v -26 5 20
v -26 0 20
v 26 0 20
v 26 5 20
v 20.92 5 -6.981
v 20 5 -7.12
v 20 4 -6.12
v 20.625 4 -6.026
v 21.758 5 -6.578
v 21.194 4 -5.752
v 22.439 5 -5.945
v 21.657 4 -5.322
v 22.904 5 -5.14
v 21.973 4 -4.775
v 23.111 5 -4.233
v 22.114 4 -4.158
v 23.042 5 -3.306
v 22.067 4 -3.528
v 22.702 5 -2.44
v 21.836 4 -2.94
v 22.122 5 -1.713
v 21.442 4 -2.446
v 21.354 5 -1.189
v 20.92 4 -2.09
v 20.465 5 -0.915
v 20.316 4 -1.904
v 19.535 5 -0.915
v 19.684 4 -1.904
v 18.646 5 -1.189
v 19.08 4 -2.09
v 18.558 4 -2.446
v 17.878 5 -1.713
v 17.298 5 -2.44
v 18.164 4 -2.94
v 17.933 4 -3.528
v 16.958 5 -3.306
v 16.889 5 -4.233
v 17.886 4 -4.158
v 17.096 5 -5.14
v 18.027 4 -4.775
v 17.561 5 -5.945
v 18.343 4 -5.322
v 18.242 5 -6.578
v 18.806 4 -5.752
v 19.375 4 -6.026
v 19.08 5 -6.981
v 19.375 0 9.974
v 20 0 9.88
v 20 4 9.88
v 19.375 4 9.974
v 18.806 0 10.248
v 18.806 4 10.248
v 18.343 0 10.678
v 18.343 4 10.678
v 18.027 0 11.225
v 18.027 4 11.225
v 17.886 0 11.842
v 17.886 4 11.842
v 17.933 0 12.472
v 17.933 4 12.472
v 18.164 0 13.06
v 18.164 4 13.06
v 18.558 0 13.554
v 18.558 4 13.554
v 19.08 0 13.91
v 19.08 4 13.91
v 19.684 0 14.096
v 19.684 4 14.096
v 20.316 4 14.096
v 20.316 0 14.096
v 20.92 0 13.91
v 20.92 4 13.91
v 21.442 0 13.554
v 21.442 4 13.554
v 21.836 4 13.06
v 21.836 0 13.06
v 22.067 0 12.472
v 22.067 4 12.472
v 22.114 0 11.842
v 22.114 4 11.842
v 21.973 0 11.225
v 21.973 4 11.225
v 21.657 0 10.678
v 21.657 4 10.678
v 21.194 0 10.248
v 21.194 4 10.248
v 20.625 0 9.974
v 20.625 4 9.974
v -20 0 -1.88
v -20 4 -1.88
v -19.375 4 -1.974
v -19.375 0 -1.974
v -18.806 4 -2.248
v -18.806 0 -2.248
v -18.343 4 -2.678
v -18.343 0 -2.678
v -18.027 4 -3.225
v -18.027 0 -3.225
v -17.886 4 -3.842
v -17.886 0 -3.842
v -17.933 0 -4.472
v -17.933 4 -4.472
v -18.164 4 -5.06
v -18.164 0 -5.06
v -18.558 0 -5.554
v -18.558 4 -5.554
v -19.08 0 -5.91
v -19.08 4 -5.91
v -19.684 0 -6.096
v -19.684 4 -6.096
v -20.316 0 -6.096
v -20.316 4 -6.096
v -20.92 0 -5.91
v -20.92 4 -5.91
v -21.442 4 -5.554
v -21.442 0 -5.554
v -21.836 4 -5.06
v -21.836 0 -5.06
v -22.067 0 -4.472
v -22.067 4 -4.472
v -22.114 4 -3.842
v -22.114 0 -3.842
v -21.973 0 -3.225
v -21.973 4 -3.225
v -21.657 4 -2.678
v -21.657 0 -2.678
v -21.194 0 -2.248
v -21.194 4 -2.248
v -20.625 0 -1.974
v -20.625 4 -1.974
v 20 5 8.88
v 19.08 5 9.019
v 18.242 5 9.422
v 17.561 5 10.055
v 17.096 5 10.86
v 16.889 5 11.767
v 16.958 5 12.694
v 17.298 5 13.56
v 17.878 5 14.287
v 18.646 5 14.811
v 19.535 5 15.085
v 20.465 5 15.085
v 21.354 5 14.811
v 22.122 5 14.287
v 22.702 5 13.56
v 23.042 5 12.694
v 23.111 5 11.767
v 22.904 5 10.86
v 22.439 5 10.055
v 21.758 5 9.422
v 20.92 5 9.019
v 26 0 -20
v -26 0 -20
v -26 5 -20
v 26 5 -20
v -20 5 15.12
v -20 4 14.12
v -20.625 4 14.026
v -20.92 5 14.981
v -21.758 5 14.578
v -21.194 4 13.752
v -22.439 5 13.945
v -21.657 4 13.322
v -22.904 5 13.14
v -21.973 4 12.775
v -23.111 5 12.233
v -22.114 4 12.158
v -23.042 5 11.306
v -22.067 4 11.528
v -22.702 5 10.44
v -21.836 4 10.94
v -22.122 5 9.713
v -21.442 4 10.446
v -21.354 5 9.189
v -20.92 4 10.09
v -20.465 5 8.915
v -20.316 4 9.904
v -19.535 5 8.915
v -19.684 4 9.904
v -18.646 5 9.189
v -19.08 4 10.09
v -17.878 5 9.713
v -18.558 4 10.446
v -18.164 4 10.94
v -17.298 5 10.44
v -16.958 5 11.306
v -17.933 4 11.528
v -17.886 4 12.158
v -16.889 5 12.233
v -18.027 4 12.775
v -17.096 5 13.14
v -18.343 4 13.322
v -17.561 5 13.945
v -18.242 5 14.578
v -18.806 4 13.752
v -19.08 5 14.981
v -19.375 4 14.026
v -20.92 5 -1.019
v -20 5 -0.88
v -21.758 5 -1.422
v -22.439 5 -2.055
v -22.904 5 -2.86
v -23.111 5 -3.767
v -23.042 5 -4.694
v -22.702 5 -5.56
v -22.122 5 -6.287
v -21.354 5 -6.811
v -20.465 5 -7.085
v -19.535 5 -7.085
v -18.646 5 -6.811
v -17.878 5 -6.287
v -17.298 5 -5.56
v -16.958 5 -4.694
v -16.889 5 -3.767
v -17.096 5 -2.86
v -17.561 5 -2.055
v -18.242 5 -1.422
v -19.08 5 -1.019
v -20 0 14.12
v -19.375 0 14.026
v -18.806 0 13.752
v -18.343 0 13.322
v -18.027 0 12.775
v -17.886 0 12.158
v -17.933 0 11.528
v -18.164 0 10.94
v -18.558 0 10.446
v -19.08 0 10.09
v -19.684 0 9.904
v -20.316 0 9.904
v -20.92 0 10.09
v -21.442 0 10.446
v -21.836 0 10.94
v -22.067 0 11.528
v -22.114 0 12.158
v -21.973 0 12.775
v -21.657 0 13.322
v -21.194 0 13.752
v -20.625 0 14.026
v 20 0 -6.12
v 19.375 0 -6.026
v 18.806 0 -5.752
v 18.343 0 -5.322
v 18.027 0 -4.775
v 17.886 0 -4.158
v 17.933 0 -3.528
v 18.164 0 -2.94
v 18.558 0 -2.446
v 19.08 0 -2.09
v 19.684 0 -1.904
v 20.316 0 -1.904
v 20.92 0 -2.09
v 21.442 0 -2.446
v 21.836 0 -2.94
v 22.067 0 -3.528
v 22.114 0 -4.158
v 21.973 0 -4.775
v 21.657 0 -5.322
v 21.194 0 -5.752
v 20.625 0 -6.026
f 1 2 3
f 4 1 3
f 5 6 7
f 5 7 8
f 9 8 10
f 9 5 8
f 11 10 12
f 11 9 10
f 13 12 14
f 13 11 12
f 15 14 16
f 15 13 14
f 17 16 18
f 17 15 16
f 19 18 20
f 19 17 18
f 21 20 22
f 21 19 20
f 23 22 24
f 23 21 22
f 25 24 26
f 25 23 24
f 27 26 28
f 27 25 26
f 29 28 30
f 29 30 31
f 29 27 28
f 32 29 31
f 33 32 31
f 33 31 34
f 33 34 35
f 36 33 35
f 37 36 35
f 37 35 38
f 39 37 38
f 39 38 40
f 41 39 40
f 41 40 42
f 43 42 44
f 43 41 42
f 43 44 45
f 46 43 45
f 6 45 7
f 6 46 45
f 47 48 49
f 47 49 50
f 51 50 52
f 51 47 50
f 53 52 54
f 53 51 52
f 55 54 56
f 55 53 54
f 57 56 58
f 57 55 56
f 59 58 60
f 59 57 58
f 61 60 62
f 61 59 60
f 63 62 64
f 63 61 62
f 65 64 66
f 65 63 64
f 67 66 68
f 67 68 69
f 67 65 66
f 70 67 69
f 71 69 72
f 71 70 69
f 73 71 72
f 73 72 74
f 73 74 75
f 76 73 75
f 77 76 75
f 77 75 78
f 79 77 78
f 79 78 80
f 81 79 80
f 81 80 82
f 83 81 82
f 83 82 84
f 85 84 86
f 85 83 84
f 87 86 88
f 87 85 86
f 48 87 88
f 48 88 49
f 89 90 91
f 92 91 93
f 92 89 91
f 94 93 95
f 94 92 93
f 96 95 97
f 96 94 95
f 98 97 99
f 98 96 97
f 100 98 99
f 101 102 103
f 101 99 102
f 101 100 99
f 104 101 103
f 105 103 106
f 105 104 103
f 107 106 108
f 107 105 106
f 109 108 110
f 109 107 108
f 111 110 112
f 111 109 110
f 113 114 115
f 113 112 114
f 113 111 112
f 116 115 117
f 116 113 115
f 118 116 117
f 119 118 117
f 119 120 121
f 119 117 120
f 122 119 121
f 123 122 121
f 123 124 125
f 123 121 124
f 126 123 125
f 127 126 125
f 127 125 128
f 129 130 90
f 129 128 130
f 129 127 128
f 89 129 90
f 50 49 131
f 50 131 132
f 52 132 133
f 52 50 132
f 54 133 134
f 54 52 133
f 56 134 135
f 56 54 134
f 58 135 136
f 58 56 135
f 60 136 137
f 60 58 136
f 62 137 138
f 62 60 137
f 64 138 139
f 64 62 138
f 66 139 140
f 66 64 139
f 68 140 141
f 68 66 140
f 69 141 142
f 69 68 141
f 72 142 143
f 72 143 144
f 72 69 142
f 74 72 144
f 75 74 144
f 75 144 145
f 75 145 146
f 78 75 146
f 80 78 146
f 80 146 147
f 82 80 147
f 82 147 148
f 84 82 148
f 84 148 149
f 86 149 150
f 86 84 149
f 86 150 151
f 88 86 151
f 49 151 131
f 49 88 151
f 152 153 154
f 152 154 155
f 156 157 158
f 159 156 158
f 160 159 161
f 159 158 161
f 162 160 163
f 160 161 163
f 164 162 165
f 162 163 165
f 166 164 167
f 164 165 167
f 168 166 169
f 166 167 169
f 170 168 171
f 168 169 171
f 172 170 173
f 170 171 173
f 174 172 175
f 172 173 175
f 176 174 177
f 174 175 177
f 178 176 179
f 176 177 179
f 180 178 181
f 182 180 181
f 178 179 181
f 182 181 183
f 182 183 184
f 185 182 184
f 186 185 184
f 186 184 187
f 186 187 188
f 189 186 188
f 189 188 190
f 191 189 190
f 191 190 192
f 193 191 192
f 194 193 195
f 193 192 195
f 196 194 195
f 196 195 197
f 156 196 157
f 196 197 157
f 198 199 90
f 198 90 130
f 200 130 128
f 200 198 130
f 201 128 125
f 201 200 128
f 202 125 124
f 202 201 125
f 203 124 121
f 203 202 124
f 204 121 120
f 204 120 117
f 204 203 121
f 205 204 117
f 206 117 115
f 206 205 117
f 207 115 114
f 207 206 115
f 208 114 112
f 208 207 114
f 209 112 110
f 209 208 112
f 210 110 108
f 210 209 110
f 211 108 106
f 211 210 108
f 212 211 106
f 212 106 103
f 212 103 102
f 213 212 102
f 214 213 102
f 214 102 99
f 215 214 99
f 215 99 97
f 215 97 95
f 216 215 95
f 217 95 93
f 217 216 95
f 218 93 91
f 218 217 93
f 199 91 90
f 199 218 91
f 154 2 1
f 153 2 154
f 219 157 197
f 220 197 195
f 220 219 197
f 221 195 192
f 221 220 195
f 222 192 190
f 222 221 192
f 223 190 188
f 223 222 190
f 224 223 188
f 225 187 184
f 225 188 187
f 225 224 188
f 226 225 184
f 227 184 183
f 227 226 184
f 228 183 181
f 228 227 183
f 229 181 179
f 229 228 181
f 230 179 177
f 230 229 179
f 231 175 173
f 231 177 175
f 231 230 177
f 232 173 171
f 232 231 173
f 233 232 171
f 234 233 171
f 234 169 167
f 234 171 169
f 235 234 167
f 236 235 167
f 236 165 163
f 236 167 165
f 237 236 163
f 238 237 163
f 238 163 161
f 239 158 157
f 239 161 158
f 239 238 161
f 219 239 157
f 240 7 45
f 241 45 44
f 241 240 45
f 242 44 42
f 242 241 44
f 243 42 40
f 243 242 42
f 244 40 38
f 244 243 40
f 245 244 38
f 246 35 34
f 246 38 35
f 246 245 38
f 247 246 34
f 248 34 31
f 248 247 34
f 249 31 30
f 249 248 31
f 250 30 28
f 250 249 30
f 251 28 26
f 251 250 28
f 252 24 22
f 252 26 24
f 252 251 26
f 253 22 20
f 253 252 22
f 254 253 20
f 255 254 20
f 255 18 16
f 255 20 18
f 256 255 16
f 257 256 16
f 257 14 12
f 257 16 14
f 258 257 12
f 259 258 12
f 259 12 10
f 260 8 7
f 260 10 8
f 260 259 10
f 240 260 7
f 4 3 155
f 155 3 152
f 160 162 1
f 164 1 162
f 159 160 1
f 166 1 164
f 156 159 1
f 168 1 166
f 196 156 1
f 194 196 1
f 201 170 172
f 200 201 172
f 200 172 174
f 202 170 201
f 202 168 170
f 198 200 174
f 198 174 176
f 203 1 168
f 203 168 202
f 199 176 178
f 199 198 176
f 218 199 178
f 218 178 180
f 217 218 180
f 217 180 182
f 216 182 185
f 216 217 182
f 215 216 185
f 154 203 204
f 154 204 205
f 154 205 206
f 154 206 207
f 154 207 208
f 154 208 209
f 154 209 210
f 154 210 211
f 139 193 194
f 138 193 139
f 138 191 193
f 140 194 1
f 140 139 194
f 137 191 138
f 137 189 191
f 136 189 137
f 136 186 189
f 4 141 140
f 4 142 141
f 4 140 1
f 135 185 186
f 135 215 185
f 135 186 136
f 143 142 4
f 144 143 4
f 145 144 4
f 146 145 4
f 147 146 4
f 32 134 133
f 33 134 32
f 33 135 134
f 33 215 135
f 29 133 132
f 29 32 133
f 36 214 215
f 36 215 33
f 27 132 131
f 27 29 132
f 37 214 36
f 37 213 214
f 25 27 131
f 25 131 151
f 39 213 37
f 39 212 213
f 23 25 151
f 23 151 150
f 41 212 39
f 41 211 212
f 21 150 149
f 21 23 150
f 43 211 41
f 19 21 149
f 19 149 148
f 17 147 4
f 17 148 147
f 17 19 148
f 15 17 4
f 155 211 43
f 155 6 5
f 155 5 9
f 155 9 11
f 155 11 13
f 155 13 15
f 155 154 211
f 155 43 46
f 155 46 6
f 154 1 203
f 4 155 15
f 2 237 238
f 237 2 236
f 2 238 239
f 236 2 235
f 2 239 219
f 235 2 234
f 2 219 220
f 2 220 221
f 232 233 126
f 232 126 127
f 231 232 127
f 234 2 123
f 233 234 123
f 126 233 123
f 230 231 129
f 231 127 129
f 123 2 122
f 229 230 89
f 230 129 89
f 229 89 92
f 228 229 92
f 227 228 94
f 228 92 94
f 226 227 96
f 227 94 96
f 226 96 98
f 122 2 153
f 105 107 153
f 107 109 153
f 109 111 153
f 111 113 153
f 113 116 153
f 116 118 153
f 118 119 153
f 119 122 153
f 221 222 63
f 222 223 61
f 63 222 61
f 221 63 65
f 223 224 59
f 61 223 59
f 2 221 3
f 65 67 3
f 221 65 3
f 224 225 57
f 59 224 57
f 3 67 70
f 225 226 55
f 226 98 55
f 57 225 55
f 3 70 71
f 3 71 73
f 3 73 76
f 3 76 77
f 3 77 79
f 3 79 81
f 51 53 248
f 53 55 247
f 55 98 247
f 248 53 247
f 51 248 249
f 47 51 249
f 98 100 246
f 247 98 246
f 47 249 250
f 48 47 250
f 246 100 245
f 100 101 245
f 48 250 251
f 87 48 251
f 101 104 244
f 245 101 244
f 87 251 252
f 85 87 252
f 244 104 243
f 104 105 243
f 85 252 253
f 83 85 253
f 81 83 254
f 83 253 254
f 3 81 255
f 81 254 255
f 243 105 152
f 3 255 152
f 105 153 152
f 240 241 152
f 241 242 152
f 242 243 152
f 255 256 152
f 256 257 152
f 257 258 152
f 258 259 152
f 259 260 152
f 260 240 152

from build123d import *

# Parameters (mm, degrees)
SKETCH1_W            = 52
SKETCH1_H            = 40
SKETCH1_R            = 2.75
BOSS_EXTRUDE10_DEPTH = 5
SKETCH1_21_R         = 2.75
BOSS_EXTRUDE13_DEPTH = 5
SKETCH1_22_R         = 2.12
CUT_EXTRUDE4_DEPTH   = 7
CHAMFER1_SIZE        = 1
SKETCH1_23_R         = 2.75
BOSS_EXTRUDE14_DEPTH = 5
SKETCH1_24_R         = 2.12
CUT_EXTRUDE6_DEPTH   = 5
SKETCH1_25_R         = 2.75
BOSS_EXTRUDE15_DEPTH = 5
SKETCH1_26_R         = 2.12
CUT_EXTRUDE7_DEPTH   = 18
SKETCH1_29_R         = 2.75
BOSS_EXTRUDE17_DEPTH = 5
SKETCH1_30_R         = 2.12
CUT_EXTRUDE9_DEPTH   = 14
CHAMFER3_SIZE        = 1
CHAMFER4_SIZE        = 1
CHAMFER5_SIZE        = 1


with BuildPart() as part:
    # Sketch1 → Boss-Extrude10 (new body)
    with BuildSketch(Plane(origin=(0, 0, 0), x_dir=(1, 0, 0), z_dir=(0, 1, 0))):
        Rectangle(SKETCH1_W, SKETCH1_H)
        with Locations((-20, -12)):
            Circle(SKETCH1_R, mode=Mode.SUBTRACT)
        with Locations((20, -12)):
            Circle(SKETCH1_R, mode=Mode.SUBTRACT)
        with Locations((-20, 4)):
            Circle(SKETCH1_R, mode=Mode.SUBTRACT)
        with Locations((20, 4)):
            Circle(SKETCH1_R, mode=Mode.SUBTRACT)
    extrude(amount=BOSS_EXTRUDE10_DEPTH)

    # Sketch1<21> → Boss-Extrude13 (add)
    with BuildSketch(Plane(origin=(0, 0, 0), x_dir=(1, 0, 0), z_dir=(0, 1, 0))):
        with Locations((20, 4)):
            Circle(SKETCH1_21_R)
    extrude(amount=BOSS_EXTRUDE13_DEPTH)

    # Sketch1<22> → Cut-Extrude4 (cut)
    with BuildSketch(Plane(origin=(0, 0, 0), x_dir=(1, 0, 0), z_dir=(0, 1, 0))):
        with Locations((20, 4)):
            Circle(SKETCH1_22_R)
    extrude(amount=CUT_EXTRUDE4_DEPTH, mode=Mode.SUBTRACT)

    # Chamfer1
    chamfer1_edges = [part.edges().sort_by_distance(p)[0] for p in [
        (17.88, 5, -4),
    ]]
    chamfer(chamfer1_edges, length=CHAMFER1_SIZE)

    # Sketch1<23> → Boss-Extrude14 (add)
    with BuildSketch(Plane(origin=(0, 0, 0), x_dir=(1, 0, 0), z_dir=(0, 1, 0))):
        with Locations((20, -12)):
            Circle(SKETCH1_23_R)
    extrude(amount=BOSS_EXTRUDE14_DEPTH)

    # Sketch1<24> → Cut-Extrude6 (cut)
    with BuildSketch(Plane(origin=(0, 0, 0), x_dir=(1, 0, 0), z_dir=(0, 1, 0))):
        with Locations((20, -12)):
            Circle(SKETCH1_24_R)
    extrude(amount=CUT_EXTRUDE6_DEPTH, mode=Mode.SUBTRACT)

    # Sketch1<25> → Boss-Extrude15 (add)
    with BuildSketch(Plane(origin=(0, 0, 0), x_dir=(1, 0, 0), z_dir=(0, 1, 0))):
        with Locations((-20, -12)):
            Circle(SKETCH1_25_R)
    extrude(amount=BOSS_EXTRUDE15_DEPTH)

    # Sketch1<26> → Cut-Extrude7 (cut)
    with BuildSketch(Plane(origin=(0, 0, 0), x_dir=(1, 0, 0), z_dir=(0, 1, 0))):
        with Locations((-20, -12)):
            Circle(SKETCH1_26_R)
    extrude(amount=CUT_EXTRUDE7_DEPTH, mode=Mode.SUBTRACT)

    # Sketch1<29> → Boss-Extrude17 (add)
    with BuildSketch(Plane(origin=(0, 0, 0), x_dir=(1, 0, 0), z_dir=(0, 1, 0))):
        with Locations((-20, 4)):
            Circle(SKETCH1_29_R)
    extrude(amount=BOSS_EXTRUDE17_DEPTH)

    # Sketch1<30> → Cut-Extrude9 (cut)
    with BuildSketch(Plane(origin=(0, 0, 0), x_dir=(1, 0, 0), z_dir=(0, 1, 0))):
        with Locations((-20, 4)):
            Circle(SKETCH1_30_R)
    extrude(amount=CUT_EXTRUDE9_DEPTH, mode=Mode.SUBTRACT)

    # Chamfer3
    chamfer3_edges = [part.edges().sort_by_distance(p)[0] for p in [
        (-22.12, 5, -4),
    ]]
    chamfer(chamfer3_edges, length=CHAMFER3_SIZE)

    # Chamfer4
    chamfer4_edges = [part.edges().sort_by_distance(p)[0] for p in [
        (-22.12, 5, 12),
    ]]
    chamfer(chamfer4_edges, length=CHAMFER4_SIZE)

    # Chamfer5
    chamfer5_edges = [part.edges().sort_by_distance(p)[0] for p in [
        (17.88, 5, 12),
    ]]
    chamfer(chamfer5_edges, length=CHAMFER5_SIZE)


solid = part.part
